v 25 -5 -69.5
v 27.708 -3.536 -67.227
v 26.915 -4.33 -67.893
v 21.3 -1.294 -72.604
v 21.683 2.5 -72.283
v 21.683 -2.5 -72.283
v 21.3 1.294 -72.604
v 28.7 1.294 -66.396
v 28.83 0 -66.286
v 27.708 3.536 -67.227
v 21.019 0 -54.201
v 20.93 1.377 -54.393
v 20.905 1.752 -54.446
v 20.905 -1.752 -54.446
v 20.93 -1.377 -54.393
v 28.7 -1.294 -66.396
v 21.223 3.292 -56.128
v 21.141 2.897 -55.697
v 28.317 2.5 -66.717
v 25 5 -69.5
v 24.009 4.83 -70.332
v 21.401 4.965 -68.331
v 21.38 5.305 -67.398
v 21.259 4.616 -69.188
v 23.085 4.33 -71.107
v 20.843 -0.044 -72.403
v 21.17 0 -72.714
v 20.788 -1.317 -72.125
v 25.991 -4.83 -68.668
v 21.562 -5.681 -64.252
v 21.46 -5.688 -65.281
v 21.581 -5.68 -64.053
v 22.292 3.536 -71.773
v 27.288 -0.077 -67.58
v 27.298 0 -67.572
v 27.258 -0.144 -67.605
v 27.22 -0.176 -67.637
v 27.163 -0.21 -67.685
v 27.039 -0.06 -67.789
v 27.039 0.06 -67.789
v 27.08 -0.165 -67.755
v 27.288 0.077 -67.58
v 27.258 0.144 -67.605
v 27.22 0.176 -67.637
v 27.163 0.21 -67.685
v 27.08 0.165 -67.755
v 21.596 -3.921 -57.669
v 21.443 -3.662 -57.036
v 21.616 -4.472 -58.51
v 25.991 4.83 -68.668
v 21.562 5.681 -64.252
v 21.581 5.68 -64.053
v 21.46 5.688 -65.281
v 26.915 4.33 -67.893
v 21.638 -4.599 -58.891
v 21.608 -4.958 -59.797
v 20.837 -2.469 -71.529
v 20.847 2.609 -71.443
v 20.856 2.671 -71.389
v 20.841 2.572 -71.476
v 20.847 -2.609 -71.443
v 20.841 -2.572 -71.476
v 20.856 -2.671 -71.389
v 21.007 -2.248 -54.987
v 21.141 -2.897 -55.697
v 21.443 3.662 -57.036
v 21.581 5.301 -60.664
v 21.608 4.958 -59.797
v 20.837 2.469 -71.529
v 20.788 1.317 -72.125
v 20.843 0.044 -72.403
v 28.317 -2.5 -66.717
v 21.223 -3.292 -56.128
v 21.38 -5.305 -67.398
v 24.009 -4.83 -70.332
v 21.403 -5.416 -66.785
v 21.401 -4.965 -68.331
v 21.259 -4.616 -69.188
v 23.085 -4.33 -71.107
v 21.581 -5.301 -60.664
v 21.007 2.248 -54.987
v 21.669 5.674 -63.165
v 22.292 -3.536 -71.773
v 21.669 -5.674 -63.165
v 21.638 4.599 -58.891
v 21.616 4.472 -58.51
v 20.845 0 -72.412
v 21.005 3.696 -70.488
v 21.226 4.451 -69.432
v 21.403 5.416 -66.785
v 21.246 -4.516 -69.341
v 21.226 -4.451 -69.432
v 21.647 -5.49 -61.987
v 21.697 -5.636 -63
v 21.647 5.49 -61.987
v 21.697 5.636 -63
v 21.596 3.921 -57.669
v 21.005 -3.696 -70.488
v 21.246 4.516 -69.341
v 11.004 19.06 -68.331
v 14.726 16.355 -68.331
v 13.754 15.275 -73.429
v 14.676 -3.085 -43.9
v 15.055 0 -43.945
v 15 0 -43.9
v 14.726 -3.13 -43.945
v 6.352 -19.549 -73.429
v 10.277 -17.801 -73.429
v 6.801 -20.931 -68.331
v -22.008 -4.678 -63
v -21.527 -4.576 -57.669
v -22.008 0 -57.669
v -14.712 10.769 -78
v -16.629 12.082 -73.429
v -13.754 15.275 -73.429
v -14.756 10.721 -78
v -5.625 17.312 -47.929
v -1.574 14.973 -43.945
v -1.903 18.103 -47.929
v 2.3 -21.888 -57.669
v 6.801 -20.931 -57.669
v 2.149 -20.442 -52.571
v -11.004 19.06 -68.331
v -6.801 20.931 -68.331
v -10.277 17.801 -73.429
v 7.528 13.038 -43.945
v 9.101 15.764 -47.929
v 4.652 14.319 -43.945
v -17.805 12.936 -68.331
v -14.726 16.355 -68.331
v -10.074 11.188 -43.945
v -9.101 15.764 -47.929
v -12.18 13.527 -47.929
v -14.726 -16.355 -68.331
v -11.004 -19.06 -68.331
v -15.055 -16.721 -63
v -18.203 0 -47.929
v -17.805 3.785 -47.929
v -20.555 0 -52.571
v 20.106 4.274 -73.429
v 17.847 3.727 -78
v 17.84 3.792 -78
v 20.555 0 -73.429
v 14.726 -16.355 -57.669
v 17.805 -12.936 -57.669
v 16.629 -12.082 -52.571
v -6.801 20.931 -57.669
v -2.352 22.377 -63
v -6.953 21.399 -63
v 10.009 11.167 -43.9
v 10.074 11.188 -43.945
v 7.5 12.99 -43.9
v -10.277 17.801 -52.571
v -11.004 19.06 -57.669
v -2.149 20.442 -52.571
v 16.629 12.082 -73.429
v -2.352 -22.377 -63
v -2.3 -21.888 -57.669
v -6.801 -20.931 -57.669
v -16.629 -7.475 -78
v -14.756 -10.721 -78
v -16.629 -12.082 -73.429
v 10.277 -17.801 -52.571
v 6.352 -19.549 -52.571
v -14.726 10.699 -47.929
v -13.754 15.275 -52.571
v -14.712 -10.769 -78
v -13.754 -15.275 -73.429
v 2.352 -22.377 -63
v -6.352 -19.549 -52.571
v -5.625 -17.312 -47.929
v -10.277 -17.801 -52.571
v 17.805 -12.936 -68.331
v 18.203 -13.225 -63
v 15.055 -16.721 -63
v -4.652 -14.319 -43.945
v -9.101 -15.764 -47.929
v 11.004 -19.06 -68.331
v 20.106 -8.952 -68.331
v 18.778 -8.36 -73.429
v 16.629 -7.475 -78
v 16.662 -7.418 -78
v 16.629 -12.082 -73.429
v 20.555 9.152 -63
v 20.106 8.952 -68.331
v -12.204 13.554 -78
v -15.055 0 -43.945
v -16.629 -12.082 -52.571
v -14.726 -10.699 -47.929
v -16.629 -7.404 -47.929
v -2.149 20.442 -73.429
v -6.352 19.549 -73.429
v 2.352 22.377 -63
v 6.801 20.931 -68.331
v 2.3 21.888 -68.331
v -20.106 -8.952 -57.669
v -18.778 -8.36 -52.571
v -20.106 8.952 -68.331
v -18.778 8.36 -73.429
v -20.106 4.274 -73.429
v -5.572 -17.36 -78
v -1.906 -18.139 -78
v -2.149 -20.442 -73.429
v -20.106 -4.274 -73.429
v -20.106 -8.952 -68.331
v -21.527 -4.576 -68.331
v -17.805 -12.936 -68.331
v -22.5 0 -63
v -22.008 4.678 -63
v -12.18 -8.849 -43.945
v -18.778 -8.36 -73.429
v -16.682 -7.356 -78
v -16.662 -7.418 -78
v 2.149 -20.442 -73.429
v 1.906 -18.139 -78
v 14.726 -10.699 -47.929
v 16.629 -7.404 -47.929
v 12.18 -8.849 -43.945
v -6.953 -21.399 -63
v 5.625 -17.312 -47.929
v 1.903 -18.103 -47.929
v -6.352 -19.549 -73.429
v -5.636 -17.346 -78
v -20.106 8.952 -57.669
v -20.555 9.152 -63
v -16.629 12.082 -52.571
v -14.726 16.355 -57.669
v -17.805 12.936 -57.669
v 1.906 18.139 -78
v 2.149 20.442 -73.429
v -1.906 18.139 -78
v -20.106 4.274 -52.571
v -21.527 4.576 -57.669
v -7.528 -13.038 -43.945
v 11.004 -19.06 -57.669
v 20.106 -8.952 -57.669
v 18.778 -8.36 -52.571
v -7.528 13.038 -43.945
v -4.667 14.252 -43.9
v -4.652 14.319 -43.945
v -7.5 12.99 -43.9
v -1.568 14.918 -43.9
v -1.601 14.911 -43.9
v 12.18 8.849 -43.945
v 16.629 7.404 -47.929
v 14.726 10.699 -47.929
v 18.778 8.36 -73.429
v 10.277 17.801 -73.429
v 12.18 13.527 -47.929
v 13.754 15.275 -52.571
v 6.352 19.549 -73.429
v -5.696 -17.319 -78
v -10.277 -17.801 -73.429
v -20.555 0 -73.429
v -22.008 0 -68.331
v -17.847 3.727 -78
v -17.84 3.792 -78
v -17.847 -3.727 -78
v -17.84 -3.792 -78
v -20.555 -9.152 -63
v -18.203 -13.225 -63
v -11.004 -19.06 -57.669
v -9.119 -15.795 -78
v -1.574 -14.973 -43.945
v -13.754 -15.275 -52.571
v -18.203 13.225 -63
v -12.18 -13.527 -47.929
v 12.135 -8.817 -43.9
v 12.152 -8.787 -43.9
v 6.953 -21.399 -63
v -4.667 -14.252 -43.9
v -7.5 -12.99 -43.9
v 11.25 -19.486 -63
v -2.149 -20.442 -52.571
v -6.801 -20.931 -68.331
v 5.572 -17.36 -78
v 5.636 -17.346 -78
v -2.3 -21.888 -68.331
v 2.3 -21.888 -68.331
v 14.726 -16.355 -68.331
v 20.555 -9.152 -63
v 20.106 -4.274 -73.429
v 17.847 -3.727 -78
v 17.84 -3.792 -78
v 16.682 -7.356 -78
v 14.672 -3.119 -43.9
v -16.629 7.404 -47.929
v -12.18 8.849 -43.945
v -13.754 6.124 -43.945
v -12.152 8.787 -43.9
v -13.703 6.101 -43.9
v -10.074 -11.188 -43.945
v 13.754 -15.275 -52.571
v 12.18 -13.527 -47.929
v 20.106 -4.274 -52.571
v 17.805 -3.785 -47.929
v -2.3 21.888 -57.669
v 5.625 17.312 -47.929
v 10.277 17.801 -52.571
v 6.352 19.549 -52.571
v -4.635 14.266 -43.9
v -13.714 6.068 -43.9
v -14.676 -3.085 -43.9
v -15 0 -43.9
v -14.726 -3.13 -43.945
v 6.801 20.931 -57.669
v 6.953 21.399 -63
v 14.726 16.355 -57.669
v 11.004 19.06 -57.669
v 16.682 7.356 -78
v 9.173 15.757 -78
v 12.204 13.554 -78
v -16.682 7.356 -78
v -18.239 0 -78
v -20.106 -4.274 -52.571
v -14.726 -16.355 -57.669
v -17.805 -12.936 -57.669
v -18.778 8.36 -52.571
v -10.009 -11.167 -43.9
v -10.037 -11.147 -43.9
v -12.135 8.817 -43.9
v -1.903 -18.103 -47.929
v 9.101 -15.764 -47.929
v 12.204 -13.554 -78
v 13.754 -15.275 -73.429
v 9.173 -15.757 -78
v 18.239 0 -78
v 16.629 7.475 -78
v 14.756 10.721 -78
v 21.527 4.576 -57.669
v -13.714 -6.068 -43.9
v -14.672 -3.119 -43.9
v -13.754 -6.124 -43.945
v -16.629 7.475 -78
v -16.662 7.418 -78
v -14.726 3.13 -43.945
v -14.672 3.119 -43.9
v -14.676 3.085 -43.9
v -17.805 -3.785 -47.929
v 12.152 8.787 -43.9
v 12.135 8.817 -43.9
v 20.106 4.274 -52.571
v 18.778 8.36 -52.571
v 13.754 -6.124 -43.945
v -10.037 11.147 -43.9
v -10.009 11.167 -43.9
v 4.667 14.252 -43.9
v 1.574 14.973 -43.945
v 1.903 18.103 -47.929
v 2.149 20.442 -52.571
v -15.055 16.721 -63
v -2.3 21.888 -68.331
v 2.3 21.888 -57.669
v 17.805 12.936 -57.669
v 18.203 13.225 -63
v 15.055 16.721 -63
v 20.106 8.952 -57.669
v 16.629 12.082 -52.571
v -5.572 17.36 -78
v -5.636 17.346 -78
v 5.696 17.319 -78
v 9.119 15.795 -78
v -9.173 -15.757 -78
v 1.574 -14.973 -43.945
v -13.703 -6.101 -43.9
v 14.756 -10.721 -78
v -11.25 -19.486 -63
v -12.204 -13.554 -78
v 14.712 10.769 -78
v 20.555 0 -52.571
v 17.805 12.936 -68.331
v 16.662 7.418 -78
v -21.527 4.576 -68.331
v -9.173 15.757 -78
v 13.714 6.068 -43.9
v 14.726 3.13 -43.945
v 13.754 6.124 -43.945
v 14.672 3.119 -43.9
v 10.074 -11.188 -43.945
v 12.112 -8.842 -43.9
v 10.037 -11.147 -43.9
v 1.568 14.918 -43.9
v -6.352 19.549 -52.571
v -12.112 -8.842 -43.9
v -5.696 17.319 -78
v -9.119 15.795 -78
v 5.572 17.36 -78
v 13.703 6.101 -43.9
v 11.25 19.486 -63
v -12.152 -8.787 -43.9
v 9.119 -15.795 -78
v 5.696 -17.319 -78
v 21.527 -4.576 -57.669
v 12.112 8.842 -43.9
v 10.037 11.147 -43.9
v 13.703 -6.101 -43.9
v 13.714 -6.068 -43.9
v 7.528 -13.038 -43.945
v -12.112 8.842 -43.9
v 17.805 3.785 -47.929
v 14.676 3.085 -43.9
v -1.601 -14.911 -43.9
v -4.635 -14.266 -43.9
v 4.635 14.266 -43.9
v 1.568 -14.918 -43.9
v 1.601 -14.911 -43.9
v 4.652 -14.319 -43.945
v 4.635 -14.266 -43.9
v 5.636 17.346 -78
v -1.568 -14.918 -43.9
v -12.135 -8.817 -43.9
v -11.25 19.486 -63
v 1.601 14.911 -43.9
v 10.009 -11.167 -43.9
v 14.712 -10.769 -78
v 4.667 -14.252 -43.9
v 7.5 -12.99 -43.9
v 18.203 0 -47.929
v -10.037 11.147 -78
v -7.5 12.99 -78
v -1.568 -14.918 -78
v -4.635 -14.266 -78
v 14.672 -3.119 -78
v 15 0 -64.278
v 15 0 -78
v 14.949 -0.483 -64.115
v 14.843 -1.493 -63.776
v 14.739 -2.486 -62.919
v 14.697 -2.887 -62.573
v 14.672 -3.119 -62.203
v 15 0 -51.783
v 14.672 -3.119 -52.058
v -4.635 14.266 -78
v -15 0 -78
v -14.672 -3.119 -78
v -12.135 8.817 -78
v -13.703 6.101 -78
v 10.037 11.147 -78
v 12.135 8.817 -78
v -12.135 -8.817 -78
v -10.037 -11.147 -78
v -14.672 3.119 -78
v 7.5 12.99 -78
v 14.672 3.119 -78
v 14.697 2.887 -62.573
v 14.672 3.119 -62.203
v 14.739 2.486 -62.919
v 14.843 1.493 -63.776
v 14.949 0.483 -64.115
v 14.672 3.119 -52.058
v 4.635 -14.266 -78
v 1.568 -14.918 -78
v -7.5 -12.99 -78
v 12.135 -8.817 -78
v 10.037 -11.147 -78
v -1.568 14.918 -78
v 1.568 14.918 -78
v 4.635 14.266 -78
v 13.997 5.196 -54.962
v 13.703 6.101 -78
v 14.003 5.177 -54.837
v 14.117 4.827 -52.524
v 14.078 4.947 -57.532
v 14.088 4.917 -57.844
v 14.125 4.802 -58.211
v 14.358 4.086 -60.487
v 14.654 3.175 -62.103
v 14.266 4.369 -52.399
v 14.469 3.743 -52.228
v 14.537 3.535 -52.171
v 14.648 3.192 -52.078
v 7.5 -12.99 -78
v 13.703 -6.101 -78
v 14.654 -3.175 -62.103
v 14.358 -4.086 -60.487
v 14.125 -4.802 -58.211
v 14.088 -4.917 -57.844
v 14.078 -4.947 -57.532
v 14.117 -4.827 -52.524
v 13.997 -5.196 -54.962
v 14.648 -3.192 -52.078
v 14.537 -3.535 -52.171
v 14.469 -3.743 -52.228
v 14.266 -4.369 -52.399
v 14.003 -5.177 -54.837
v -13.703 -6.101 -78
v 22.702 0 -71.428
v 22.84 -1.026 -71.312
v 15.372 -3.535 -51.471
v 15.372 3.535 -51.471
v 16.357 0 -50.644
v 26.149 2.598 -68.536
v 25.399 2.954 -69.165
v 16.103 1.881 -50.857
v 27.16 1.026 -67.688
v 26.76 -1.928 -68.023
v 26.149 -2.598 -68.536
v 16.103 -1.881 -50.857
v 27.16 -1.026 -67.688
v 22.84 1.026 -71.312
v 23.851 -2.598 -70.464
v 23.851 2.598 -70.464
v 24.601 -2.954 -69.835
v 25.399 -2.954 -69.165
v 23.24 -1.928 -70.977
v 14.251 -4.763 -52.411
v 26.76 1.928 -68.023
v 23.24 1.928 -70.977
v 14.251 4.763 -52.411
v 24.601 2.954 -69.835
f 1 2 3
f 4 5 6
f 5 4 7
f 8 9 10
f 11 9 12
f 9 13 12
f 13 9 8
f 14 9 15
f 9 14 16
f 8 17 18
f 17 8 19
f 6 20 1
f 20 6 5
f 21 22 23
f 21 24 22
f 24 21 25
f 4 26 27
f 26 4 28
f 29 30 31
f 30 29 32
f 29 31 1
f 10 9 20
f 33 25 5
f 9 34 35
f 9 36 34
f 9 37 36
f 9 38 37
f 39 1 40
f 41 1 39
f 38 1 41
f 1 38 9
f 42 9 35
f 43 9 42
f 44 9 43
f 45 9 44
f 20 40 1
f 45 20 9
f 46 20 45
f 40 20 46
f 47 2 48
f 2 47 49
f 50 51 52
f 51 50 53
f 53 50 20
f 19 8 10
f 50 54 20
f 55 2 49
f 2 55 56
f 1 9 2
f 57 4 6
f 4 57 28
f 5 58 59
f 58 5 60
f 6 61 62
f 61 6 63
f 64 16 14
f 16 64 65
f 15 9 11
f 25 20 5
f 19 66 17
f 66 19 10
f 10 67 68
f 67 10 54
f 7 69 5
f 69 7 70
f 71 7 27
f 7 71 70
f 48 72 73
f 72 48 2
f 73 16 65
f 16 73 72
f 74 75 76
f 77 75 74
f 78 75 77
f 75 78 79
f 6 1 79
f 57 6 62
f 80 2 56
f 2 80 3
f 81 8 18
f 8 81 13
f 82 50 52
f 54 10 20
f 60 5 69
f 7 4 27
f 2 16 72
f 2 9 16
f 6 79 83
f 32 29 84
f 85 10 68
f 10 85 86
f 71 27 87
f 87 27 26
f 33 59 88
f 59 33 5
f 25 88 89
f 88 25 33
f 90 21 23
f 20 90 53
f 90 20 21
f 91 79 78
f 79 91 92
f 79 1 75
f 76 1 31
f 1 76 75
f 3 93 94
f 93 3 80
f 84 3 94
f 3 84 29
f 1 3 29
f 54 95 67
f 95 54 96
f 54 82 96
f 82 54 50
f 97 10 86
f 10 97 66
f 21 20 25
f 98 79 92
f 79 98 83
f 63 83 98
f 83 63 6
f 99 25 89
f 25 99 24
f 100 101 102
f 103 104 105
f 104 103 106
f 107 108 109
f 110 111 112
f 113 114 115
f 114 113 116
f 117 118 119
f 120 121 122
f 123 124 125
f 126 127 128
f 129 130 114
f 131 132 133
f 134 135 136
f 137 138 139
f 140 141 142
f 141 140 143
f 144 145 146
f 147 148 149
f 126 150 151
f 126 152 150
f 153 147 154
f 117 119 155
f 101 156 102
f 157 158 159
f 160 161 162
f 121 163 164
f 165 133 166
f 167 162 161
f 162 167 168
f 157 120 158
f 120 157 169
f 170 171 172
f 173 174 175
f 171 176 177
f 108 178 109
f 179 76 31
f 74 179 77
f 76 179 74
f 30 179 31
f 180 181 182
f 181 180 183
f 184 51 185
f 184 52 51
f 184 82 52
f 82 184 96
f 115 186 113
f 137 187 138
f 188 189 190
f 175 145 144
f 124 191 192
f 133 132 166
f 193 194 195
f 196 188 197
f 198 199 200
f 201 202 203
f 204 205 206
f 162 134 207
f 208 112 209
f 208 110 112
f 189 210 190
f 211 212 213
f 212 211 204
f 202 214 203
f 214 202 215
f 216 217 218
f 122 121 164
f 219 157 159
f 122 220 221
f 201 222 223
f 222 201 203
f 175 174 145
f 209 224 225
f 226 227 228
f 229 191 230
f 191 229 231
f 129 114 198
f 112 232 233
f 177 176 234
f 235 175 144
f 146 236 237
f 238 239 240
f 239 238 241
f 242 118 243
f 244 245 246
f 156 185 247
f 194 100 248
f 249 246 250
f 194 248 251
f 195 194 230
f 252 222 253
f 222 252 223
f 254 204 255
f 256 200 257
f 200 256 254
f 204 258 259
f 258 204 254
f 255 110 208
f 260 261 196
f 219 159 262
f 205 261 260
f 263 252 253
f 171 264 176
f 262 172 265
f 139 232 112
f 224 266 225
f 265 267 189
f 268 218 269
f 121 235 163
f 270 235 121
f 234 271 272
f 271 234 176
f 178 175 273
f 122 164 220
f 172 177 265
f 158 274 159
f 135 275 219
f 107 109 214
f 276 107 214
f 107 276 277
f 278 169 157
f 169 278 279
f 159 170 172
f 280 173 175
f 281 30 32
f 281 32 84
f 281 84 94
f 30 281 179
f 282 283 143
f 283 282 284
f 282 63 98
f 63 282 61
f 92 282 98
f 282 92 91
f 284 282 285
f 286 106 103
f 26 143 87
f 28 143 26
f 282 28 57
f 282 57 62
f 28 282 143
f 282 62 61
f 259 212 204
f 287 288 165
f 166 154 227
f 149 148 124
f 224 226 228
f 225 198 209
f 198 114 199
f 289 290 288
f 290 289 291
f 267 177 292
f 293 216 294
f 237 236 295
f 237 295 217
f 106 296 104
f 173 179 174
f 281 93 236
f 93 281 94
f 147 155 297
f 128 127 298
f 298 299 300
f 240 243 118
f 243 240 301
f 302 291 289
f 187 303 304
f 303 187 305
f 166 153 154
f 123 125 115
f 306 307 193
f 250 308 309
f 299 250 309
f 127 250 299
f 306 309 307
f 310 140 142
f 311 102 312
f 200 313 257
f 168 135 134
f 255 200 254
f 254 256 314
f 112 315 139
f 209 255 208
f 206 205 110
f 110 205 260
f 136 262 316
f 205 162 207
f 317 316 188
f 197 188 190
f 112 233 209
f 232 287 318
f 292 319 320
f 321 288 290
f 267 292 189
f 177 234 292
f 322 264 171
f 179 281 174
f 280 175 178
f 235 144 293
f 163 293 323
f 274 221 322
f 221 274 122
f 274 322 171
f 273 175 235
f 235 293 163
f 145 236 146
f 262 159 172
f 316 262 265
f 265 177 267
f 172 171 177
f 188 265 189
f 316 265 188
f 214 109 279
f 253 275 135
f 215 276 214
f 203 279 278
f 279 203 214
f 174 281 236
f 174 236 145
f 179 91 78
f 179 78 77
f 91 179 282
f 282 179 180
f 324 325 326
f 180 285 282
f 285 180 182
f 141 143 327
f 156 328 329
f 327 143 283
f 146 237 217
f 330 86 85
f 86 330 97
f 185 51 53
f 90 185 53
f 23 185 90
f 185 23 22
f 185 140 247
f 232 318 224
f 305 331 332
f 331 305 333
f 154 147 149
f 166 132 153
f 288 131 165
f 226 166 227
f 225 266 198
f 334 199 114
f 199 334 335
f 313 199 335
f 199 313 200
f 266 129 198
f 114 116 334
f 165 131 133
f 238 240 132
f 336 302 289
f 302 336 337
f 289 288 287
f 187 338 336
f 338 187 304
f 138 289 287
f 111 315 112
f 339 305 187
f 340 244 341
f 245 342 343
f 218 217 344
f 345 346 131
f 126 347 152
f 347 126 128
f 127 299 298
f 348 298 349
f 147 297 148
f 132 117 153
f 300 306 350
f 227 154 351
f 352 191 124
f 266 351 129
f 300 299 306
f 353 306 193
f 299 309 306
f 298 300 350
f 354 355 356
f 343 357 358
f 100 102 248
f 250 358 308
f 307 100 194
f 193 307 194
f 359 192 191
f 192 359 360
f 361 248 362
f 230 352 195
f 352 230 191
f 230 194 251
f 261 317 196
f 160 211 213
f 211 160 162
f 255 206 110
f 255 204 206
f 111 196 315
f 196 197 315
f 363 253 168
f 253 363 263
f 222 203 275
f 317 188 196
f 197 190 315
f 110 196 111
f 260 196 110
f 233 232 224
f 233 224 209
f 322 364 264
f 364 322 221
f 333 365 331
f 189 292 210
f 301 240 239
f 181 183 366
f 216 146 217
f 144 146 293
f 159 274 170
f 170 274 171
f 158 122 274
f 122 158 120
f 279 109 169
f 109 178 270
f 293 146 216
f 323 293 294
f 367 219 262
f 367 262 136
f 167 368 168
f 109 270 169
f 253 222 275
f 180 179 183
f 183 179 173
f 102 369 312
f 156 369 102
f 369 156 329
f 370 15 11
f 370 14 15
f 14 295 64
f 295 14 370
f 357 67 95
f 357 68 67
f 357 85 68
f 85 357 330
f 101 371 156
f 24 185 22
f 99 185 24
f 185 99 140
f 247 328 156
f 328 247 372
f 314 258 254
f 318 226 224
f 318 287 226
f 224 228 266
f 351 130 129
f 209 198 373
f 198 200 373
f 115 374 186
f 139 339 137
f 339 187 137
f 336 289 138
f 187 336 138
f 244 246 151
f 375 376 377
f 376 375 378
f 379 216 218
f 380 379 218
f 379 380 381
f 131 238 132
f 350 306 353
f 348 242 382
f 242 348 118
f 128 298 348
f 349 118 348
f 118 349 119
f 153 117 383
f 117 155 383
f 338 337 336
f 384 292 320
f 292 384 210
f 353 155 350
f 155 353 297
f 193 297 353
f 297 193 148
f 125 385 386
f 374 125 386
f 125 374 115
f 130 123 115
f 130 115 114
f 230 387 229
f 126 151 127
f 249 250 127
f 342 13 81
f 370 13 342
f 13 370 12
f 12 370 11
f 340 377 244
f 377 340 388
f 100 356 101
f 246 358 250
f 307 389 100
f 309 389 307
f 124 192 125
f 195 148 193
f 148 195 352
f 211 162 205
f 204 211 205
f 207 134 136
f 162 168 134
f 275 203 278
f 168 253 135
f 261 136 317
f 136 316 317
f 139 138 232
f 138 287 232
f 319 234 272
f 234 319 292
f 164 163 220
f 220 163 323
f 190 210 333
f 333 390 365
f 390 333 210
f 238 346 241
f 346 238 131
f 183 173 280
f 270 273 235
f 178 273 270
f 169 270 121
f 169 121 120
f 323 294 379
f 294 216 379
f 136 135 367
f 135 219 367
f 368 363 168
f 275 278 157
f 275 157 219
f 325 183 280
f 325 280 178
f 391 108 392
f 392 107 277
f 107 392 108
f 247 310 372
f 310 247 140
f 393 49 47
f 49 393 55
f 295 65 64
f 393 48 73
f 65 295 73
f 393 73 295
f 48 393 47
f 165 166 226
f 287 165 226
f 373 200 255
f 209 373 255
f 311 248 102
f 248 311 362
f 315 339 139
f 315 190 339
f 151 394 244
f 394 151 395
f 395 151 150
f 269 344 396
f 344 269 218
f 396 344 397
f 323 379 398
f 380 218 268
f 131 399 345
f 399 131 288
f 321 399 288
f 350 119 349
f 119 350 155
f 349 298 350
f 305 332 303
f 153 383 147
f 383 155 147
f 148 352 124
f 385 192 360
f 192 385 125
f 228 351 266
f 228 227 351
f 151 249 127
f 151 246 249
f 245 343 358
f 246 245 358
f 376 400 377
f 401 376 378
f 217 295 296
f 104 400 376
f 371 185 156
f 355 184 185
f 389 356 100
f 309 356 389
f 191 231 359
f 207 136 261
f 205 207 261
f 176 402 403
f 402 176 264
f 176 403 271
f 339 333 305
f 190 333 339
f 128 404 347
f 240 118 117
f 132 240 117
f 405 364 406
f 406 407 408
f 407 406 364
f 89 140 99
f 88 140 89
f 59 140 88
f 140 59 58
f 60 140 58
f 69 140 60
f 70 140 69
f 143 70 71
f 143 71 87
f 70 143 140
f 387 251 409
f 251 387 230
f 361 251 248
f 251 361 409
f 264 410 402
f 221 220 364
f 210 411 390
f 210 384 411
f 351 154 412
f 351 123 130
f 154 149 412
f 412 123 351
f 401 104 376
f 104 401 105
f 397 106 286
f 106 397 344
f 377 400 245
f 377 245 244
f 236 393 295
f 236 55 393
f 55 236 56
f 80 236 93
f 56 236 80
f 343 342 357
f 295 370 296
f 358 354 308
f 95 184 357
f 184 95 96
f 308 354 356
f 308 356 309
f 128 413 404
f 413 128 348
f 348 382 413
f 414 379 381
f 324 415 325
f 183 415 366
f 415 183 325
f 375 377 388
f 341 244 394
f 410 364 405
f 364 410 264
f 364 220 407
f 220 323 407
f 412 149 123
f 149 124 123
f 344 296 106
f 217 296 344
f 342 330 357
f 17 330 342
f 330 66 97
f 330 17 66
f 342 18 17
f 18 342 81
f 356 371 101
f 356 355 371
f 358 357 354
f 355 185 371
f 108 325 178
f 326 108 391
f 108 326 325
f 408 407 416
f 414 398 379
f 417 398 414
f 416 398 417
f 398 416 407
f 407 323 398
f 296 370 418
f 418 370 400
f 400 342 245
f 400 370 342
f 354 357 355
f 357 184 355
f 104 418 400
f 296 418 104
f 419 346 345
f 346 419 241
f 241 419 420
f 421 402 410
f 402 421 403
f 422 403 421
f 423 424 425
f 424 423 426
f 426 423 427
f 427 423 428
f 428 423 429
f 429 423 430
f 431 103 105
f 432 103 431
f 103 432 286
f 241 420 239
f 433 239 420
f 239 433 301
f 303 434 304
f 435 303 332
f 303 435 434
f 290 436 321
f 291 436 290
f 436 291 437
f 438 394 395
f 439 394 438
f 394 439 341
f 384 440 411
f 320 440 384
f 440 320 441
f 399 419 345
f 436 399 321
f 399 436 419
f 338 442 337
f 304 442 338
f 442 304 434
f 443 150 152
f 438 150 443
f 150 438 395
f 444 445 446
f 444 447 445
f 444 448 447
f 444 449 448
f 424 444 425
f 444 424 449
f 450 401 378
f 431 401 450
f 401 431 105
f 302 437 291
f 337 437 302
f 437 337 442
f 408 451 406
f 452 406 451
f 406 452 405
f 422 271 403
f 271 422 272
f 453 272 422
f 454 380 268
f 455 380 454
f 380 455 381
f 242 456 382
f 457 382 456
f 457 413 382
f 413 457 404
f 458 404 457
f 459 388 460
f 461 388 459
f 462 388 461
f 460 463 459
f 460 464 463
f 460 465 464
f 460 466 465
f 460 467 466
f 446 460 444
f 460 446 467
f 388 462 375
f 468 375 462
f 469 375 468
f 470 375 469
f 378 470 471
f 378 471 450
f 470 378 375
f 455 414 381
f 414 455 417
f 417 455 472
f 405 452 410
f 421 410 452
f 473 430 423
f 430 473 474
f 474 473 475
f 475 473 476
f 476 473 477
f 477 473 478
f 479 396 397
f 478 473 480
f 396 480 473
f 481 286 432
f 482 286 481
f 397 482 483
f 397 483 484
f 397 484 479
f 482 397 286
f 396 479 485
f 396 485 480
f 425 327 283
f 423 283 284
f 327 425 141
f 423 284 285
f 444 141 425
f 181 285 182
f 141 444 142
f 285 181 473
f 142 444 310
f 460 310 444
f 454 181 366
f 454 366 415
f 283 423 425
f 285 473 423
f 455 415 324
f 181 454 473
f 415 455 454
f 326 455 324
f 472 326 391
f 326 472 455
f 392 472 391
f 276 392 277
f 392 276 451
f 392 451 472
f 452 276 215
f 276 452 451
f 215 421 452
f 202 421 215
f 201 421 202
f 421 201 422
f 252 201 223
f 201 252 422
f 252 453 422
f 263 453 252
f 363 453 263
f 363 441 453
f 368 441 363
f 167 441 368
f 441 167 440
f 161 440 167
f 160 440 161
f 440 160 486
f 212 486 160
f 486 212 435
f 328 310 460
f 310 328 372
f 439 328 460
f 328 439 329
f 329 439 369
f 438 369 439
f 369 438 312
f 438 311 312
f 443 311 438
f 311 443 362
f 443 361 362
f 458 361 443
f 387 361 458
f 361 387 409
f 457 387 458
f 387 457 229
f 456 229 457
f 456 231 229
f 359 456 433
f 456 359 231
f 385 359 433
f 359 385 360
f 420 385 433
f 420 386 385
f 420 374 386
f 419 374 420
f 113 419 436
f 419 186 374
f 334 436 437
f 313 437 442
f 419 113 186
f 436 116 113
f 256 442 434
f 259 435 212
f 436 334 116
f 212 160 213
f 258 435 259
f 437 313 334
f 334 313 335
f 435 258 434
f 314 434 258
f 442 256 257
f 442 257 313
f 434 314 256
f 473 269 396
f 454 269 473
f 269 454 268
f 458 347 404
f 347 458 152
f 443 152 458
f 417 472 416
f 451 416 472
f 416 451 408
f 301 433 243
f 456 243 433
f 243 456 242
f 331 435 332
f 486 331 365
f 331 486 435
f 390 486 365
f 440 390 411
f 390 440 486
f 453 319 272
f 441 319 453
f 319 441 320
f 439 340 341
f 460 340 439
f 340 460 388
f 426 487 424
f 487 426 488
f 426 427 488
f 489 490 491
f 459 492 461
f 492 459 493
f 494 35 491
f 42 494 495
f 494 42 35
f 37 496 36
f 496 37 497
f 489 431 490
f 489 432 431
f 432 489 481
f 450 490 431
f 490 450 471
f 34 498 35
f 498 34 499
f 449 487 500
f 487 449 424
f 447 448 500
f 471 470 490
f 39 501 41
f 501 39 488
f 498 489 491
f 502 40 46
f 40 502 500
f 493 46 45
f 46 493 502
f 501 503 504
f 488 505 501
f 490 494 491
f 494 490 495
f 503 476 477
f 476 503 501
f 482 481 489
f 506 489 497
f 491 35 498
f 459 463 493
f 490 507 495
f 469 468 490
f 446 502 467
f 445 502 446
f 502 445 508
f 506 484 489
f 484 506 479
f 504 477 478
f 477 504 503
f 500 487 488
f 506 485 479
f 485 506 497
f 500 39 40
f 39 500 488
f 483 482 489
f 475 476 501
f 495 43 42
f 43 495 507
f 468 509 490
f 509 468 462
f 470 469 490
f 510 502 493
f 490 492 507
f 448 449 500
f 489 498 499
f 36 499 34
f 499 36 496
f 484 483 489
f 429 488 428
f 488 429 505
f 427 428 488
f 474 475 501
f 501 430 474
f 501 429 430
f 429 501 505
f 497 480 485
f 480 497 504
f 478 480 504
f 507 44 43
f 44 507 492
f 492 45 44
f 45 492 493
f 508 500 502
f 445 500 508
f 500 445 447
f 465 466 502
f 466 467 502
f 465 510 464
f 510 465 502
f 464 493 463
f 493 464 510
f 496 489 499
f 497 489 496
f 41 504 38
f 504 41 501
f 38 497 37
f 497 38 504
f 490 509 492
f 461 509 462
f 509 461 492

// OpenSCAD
/*Leone Ermer
Faucet Drinking Fountain
2013 3D Fabrication

Notes:
	Make Faucet Attachment infill normal
	Make Fountain infill zero // support first 13 layers?

To Do List:
	Print
	Make Spout
	Figure out Sizing and Print Controls
	Plumbers Tape
	
*/

//
//Basic Controls
//
	//Display Parts
		faucetAttachment = false ;
		fountain = true;

	//Faucet Attachment (Thermochromic PLA)
		faucetDiameter = 24; //Diameter of inner circle
		attachmentHeight = 23;
		attachmentThickness = 2;
		
	//Fountain (Soft PLA)
		fountainHeight = 30;
		fountainWidth = 45;
		fountainSpoutDiameter1 = 10;
		fountainSpoutDiameter2 = 15;
		fountainSpoutLength = 20;
		fountainSpoutThickness = attachmentThickness;
			
//
//Secondary Controls
//
	//Connecter Ridge
		ridgeThickness = 2;
		ridgeHeight = 3;
	
	
	//Don't Touch
		faucetRadius = (faucetDiameter/2);
		faRadius = (faucetRadius + attachmentThickness);
		ridgeRadius = (faRadius + ridgeThickness);
		fountainRadius = (fountainWidth/2);
		fountainOval = (fountainHeight + ((fountainHeight)*.7));
		fountainCutoffs = ((fountainHeight*.7)/2);
		
		fountainSpoutRadius1 = (fountainSpoutDiameter1/2);
		fountainSpoutRadius2 = (fountainSpoutDiameter2/2);
		
//	
//Build
//

if(faucetAttachment == true){
	faucetAttachment();
	connecterRidge();
}

if(fountain == true){
	rotate([0, 180, 0])
	fountain();
	
}

//
// Modules
//

module faucetAttachment(){
	difference(){
		cylinder(attachmentHeight,faRadius,faRadius);
		cylinder(attachmentHeight,faucetRadius,faucetRadius);
	}
}

module connecterRidge(){
	difference(){
		cylinder(ridgeHeight,ridgeRadius,ridgeRadius);
		cylinder(ridgeHeight,faucetRadius,faucetRadius);
	}
}

module fountain(){
	translate([0,0,(fountainHeight+fountainCutoffs-ridgeHeight)])
	difference(){
		fountainBody();
		fountainCutouts();
	}
}

module fountainCutouts(){
		translate([0,0,(fountainCutoffs-8)])
		cylinder(fountainHeight+8,faRadius+1,faRadius+1); //Inner Cylinder
		cylinder(fountainCutoffs-8,60,60); //Bottom Cutout
		translate([0,0,(fountainOval-fountainCutoffs)]) 
		cylinder(fountainCutoffs,60,60); //Top Cutout
		translate([-25,0,32])
		rotate([0, 140, 0])
		cylinder(fountainSpoutLength,(fountainSpoutRadius1-fountainSpoutThickness),(fountainSpoutRadius2-fountainSpoutThickness));
}

module fountainSpout(){
	translate([-25,0,32])
	rotate([0, 140, 0])
	cylinder(fountainSpoutLength,fountainSpoutRadius1,fountainSpoutRadius2);		
}

module fountainBody(){
fountainSpout();
translate([0,0,(fountainOval/2)]) resize([0,0,fountainOval]) 
sphere(fountainRadius);

}
